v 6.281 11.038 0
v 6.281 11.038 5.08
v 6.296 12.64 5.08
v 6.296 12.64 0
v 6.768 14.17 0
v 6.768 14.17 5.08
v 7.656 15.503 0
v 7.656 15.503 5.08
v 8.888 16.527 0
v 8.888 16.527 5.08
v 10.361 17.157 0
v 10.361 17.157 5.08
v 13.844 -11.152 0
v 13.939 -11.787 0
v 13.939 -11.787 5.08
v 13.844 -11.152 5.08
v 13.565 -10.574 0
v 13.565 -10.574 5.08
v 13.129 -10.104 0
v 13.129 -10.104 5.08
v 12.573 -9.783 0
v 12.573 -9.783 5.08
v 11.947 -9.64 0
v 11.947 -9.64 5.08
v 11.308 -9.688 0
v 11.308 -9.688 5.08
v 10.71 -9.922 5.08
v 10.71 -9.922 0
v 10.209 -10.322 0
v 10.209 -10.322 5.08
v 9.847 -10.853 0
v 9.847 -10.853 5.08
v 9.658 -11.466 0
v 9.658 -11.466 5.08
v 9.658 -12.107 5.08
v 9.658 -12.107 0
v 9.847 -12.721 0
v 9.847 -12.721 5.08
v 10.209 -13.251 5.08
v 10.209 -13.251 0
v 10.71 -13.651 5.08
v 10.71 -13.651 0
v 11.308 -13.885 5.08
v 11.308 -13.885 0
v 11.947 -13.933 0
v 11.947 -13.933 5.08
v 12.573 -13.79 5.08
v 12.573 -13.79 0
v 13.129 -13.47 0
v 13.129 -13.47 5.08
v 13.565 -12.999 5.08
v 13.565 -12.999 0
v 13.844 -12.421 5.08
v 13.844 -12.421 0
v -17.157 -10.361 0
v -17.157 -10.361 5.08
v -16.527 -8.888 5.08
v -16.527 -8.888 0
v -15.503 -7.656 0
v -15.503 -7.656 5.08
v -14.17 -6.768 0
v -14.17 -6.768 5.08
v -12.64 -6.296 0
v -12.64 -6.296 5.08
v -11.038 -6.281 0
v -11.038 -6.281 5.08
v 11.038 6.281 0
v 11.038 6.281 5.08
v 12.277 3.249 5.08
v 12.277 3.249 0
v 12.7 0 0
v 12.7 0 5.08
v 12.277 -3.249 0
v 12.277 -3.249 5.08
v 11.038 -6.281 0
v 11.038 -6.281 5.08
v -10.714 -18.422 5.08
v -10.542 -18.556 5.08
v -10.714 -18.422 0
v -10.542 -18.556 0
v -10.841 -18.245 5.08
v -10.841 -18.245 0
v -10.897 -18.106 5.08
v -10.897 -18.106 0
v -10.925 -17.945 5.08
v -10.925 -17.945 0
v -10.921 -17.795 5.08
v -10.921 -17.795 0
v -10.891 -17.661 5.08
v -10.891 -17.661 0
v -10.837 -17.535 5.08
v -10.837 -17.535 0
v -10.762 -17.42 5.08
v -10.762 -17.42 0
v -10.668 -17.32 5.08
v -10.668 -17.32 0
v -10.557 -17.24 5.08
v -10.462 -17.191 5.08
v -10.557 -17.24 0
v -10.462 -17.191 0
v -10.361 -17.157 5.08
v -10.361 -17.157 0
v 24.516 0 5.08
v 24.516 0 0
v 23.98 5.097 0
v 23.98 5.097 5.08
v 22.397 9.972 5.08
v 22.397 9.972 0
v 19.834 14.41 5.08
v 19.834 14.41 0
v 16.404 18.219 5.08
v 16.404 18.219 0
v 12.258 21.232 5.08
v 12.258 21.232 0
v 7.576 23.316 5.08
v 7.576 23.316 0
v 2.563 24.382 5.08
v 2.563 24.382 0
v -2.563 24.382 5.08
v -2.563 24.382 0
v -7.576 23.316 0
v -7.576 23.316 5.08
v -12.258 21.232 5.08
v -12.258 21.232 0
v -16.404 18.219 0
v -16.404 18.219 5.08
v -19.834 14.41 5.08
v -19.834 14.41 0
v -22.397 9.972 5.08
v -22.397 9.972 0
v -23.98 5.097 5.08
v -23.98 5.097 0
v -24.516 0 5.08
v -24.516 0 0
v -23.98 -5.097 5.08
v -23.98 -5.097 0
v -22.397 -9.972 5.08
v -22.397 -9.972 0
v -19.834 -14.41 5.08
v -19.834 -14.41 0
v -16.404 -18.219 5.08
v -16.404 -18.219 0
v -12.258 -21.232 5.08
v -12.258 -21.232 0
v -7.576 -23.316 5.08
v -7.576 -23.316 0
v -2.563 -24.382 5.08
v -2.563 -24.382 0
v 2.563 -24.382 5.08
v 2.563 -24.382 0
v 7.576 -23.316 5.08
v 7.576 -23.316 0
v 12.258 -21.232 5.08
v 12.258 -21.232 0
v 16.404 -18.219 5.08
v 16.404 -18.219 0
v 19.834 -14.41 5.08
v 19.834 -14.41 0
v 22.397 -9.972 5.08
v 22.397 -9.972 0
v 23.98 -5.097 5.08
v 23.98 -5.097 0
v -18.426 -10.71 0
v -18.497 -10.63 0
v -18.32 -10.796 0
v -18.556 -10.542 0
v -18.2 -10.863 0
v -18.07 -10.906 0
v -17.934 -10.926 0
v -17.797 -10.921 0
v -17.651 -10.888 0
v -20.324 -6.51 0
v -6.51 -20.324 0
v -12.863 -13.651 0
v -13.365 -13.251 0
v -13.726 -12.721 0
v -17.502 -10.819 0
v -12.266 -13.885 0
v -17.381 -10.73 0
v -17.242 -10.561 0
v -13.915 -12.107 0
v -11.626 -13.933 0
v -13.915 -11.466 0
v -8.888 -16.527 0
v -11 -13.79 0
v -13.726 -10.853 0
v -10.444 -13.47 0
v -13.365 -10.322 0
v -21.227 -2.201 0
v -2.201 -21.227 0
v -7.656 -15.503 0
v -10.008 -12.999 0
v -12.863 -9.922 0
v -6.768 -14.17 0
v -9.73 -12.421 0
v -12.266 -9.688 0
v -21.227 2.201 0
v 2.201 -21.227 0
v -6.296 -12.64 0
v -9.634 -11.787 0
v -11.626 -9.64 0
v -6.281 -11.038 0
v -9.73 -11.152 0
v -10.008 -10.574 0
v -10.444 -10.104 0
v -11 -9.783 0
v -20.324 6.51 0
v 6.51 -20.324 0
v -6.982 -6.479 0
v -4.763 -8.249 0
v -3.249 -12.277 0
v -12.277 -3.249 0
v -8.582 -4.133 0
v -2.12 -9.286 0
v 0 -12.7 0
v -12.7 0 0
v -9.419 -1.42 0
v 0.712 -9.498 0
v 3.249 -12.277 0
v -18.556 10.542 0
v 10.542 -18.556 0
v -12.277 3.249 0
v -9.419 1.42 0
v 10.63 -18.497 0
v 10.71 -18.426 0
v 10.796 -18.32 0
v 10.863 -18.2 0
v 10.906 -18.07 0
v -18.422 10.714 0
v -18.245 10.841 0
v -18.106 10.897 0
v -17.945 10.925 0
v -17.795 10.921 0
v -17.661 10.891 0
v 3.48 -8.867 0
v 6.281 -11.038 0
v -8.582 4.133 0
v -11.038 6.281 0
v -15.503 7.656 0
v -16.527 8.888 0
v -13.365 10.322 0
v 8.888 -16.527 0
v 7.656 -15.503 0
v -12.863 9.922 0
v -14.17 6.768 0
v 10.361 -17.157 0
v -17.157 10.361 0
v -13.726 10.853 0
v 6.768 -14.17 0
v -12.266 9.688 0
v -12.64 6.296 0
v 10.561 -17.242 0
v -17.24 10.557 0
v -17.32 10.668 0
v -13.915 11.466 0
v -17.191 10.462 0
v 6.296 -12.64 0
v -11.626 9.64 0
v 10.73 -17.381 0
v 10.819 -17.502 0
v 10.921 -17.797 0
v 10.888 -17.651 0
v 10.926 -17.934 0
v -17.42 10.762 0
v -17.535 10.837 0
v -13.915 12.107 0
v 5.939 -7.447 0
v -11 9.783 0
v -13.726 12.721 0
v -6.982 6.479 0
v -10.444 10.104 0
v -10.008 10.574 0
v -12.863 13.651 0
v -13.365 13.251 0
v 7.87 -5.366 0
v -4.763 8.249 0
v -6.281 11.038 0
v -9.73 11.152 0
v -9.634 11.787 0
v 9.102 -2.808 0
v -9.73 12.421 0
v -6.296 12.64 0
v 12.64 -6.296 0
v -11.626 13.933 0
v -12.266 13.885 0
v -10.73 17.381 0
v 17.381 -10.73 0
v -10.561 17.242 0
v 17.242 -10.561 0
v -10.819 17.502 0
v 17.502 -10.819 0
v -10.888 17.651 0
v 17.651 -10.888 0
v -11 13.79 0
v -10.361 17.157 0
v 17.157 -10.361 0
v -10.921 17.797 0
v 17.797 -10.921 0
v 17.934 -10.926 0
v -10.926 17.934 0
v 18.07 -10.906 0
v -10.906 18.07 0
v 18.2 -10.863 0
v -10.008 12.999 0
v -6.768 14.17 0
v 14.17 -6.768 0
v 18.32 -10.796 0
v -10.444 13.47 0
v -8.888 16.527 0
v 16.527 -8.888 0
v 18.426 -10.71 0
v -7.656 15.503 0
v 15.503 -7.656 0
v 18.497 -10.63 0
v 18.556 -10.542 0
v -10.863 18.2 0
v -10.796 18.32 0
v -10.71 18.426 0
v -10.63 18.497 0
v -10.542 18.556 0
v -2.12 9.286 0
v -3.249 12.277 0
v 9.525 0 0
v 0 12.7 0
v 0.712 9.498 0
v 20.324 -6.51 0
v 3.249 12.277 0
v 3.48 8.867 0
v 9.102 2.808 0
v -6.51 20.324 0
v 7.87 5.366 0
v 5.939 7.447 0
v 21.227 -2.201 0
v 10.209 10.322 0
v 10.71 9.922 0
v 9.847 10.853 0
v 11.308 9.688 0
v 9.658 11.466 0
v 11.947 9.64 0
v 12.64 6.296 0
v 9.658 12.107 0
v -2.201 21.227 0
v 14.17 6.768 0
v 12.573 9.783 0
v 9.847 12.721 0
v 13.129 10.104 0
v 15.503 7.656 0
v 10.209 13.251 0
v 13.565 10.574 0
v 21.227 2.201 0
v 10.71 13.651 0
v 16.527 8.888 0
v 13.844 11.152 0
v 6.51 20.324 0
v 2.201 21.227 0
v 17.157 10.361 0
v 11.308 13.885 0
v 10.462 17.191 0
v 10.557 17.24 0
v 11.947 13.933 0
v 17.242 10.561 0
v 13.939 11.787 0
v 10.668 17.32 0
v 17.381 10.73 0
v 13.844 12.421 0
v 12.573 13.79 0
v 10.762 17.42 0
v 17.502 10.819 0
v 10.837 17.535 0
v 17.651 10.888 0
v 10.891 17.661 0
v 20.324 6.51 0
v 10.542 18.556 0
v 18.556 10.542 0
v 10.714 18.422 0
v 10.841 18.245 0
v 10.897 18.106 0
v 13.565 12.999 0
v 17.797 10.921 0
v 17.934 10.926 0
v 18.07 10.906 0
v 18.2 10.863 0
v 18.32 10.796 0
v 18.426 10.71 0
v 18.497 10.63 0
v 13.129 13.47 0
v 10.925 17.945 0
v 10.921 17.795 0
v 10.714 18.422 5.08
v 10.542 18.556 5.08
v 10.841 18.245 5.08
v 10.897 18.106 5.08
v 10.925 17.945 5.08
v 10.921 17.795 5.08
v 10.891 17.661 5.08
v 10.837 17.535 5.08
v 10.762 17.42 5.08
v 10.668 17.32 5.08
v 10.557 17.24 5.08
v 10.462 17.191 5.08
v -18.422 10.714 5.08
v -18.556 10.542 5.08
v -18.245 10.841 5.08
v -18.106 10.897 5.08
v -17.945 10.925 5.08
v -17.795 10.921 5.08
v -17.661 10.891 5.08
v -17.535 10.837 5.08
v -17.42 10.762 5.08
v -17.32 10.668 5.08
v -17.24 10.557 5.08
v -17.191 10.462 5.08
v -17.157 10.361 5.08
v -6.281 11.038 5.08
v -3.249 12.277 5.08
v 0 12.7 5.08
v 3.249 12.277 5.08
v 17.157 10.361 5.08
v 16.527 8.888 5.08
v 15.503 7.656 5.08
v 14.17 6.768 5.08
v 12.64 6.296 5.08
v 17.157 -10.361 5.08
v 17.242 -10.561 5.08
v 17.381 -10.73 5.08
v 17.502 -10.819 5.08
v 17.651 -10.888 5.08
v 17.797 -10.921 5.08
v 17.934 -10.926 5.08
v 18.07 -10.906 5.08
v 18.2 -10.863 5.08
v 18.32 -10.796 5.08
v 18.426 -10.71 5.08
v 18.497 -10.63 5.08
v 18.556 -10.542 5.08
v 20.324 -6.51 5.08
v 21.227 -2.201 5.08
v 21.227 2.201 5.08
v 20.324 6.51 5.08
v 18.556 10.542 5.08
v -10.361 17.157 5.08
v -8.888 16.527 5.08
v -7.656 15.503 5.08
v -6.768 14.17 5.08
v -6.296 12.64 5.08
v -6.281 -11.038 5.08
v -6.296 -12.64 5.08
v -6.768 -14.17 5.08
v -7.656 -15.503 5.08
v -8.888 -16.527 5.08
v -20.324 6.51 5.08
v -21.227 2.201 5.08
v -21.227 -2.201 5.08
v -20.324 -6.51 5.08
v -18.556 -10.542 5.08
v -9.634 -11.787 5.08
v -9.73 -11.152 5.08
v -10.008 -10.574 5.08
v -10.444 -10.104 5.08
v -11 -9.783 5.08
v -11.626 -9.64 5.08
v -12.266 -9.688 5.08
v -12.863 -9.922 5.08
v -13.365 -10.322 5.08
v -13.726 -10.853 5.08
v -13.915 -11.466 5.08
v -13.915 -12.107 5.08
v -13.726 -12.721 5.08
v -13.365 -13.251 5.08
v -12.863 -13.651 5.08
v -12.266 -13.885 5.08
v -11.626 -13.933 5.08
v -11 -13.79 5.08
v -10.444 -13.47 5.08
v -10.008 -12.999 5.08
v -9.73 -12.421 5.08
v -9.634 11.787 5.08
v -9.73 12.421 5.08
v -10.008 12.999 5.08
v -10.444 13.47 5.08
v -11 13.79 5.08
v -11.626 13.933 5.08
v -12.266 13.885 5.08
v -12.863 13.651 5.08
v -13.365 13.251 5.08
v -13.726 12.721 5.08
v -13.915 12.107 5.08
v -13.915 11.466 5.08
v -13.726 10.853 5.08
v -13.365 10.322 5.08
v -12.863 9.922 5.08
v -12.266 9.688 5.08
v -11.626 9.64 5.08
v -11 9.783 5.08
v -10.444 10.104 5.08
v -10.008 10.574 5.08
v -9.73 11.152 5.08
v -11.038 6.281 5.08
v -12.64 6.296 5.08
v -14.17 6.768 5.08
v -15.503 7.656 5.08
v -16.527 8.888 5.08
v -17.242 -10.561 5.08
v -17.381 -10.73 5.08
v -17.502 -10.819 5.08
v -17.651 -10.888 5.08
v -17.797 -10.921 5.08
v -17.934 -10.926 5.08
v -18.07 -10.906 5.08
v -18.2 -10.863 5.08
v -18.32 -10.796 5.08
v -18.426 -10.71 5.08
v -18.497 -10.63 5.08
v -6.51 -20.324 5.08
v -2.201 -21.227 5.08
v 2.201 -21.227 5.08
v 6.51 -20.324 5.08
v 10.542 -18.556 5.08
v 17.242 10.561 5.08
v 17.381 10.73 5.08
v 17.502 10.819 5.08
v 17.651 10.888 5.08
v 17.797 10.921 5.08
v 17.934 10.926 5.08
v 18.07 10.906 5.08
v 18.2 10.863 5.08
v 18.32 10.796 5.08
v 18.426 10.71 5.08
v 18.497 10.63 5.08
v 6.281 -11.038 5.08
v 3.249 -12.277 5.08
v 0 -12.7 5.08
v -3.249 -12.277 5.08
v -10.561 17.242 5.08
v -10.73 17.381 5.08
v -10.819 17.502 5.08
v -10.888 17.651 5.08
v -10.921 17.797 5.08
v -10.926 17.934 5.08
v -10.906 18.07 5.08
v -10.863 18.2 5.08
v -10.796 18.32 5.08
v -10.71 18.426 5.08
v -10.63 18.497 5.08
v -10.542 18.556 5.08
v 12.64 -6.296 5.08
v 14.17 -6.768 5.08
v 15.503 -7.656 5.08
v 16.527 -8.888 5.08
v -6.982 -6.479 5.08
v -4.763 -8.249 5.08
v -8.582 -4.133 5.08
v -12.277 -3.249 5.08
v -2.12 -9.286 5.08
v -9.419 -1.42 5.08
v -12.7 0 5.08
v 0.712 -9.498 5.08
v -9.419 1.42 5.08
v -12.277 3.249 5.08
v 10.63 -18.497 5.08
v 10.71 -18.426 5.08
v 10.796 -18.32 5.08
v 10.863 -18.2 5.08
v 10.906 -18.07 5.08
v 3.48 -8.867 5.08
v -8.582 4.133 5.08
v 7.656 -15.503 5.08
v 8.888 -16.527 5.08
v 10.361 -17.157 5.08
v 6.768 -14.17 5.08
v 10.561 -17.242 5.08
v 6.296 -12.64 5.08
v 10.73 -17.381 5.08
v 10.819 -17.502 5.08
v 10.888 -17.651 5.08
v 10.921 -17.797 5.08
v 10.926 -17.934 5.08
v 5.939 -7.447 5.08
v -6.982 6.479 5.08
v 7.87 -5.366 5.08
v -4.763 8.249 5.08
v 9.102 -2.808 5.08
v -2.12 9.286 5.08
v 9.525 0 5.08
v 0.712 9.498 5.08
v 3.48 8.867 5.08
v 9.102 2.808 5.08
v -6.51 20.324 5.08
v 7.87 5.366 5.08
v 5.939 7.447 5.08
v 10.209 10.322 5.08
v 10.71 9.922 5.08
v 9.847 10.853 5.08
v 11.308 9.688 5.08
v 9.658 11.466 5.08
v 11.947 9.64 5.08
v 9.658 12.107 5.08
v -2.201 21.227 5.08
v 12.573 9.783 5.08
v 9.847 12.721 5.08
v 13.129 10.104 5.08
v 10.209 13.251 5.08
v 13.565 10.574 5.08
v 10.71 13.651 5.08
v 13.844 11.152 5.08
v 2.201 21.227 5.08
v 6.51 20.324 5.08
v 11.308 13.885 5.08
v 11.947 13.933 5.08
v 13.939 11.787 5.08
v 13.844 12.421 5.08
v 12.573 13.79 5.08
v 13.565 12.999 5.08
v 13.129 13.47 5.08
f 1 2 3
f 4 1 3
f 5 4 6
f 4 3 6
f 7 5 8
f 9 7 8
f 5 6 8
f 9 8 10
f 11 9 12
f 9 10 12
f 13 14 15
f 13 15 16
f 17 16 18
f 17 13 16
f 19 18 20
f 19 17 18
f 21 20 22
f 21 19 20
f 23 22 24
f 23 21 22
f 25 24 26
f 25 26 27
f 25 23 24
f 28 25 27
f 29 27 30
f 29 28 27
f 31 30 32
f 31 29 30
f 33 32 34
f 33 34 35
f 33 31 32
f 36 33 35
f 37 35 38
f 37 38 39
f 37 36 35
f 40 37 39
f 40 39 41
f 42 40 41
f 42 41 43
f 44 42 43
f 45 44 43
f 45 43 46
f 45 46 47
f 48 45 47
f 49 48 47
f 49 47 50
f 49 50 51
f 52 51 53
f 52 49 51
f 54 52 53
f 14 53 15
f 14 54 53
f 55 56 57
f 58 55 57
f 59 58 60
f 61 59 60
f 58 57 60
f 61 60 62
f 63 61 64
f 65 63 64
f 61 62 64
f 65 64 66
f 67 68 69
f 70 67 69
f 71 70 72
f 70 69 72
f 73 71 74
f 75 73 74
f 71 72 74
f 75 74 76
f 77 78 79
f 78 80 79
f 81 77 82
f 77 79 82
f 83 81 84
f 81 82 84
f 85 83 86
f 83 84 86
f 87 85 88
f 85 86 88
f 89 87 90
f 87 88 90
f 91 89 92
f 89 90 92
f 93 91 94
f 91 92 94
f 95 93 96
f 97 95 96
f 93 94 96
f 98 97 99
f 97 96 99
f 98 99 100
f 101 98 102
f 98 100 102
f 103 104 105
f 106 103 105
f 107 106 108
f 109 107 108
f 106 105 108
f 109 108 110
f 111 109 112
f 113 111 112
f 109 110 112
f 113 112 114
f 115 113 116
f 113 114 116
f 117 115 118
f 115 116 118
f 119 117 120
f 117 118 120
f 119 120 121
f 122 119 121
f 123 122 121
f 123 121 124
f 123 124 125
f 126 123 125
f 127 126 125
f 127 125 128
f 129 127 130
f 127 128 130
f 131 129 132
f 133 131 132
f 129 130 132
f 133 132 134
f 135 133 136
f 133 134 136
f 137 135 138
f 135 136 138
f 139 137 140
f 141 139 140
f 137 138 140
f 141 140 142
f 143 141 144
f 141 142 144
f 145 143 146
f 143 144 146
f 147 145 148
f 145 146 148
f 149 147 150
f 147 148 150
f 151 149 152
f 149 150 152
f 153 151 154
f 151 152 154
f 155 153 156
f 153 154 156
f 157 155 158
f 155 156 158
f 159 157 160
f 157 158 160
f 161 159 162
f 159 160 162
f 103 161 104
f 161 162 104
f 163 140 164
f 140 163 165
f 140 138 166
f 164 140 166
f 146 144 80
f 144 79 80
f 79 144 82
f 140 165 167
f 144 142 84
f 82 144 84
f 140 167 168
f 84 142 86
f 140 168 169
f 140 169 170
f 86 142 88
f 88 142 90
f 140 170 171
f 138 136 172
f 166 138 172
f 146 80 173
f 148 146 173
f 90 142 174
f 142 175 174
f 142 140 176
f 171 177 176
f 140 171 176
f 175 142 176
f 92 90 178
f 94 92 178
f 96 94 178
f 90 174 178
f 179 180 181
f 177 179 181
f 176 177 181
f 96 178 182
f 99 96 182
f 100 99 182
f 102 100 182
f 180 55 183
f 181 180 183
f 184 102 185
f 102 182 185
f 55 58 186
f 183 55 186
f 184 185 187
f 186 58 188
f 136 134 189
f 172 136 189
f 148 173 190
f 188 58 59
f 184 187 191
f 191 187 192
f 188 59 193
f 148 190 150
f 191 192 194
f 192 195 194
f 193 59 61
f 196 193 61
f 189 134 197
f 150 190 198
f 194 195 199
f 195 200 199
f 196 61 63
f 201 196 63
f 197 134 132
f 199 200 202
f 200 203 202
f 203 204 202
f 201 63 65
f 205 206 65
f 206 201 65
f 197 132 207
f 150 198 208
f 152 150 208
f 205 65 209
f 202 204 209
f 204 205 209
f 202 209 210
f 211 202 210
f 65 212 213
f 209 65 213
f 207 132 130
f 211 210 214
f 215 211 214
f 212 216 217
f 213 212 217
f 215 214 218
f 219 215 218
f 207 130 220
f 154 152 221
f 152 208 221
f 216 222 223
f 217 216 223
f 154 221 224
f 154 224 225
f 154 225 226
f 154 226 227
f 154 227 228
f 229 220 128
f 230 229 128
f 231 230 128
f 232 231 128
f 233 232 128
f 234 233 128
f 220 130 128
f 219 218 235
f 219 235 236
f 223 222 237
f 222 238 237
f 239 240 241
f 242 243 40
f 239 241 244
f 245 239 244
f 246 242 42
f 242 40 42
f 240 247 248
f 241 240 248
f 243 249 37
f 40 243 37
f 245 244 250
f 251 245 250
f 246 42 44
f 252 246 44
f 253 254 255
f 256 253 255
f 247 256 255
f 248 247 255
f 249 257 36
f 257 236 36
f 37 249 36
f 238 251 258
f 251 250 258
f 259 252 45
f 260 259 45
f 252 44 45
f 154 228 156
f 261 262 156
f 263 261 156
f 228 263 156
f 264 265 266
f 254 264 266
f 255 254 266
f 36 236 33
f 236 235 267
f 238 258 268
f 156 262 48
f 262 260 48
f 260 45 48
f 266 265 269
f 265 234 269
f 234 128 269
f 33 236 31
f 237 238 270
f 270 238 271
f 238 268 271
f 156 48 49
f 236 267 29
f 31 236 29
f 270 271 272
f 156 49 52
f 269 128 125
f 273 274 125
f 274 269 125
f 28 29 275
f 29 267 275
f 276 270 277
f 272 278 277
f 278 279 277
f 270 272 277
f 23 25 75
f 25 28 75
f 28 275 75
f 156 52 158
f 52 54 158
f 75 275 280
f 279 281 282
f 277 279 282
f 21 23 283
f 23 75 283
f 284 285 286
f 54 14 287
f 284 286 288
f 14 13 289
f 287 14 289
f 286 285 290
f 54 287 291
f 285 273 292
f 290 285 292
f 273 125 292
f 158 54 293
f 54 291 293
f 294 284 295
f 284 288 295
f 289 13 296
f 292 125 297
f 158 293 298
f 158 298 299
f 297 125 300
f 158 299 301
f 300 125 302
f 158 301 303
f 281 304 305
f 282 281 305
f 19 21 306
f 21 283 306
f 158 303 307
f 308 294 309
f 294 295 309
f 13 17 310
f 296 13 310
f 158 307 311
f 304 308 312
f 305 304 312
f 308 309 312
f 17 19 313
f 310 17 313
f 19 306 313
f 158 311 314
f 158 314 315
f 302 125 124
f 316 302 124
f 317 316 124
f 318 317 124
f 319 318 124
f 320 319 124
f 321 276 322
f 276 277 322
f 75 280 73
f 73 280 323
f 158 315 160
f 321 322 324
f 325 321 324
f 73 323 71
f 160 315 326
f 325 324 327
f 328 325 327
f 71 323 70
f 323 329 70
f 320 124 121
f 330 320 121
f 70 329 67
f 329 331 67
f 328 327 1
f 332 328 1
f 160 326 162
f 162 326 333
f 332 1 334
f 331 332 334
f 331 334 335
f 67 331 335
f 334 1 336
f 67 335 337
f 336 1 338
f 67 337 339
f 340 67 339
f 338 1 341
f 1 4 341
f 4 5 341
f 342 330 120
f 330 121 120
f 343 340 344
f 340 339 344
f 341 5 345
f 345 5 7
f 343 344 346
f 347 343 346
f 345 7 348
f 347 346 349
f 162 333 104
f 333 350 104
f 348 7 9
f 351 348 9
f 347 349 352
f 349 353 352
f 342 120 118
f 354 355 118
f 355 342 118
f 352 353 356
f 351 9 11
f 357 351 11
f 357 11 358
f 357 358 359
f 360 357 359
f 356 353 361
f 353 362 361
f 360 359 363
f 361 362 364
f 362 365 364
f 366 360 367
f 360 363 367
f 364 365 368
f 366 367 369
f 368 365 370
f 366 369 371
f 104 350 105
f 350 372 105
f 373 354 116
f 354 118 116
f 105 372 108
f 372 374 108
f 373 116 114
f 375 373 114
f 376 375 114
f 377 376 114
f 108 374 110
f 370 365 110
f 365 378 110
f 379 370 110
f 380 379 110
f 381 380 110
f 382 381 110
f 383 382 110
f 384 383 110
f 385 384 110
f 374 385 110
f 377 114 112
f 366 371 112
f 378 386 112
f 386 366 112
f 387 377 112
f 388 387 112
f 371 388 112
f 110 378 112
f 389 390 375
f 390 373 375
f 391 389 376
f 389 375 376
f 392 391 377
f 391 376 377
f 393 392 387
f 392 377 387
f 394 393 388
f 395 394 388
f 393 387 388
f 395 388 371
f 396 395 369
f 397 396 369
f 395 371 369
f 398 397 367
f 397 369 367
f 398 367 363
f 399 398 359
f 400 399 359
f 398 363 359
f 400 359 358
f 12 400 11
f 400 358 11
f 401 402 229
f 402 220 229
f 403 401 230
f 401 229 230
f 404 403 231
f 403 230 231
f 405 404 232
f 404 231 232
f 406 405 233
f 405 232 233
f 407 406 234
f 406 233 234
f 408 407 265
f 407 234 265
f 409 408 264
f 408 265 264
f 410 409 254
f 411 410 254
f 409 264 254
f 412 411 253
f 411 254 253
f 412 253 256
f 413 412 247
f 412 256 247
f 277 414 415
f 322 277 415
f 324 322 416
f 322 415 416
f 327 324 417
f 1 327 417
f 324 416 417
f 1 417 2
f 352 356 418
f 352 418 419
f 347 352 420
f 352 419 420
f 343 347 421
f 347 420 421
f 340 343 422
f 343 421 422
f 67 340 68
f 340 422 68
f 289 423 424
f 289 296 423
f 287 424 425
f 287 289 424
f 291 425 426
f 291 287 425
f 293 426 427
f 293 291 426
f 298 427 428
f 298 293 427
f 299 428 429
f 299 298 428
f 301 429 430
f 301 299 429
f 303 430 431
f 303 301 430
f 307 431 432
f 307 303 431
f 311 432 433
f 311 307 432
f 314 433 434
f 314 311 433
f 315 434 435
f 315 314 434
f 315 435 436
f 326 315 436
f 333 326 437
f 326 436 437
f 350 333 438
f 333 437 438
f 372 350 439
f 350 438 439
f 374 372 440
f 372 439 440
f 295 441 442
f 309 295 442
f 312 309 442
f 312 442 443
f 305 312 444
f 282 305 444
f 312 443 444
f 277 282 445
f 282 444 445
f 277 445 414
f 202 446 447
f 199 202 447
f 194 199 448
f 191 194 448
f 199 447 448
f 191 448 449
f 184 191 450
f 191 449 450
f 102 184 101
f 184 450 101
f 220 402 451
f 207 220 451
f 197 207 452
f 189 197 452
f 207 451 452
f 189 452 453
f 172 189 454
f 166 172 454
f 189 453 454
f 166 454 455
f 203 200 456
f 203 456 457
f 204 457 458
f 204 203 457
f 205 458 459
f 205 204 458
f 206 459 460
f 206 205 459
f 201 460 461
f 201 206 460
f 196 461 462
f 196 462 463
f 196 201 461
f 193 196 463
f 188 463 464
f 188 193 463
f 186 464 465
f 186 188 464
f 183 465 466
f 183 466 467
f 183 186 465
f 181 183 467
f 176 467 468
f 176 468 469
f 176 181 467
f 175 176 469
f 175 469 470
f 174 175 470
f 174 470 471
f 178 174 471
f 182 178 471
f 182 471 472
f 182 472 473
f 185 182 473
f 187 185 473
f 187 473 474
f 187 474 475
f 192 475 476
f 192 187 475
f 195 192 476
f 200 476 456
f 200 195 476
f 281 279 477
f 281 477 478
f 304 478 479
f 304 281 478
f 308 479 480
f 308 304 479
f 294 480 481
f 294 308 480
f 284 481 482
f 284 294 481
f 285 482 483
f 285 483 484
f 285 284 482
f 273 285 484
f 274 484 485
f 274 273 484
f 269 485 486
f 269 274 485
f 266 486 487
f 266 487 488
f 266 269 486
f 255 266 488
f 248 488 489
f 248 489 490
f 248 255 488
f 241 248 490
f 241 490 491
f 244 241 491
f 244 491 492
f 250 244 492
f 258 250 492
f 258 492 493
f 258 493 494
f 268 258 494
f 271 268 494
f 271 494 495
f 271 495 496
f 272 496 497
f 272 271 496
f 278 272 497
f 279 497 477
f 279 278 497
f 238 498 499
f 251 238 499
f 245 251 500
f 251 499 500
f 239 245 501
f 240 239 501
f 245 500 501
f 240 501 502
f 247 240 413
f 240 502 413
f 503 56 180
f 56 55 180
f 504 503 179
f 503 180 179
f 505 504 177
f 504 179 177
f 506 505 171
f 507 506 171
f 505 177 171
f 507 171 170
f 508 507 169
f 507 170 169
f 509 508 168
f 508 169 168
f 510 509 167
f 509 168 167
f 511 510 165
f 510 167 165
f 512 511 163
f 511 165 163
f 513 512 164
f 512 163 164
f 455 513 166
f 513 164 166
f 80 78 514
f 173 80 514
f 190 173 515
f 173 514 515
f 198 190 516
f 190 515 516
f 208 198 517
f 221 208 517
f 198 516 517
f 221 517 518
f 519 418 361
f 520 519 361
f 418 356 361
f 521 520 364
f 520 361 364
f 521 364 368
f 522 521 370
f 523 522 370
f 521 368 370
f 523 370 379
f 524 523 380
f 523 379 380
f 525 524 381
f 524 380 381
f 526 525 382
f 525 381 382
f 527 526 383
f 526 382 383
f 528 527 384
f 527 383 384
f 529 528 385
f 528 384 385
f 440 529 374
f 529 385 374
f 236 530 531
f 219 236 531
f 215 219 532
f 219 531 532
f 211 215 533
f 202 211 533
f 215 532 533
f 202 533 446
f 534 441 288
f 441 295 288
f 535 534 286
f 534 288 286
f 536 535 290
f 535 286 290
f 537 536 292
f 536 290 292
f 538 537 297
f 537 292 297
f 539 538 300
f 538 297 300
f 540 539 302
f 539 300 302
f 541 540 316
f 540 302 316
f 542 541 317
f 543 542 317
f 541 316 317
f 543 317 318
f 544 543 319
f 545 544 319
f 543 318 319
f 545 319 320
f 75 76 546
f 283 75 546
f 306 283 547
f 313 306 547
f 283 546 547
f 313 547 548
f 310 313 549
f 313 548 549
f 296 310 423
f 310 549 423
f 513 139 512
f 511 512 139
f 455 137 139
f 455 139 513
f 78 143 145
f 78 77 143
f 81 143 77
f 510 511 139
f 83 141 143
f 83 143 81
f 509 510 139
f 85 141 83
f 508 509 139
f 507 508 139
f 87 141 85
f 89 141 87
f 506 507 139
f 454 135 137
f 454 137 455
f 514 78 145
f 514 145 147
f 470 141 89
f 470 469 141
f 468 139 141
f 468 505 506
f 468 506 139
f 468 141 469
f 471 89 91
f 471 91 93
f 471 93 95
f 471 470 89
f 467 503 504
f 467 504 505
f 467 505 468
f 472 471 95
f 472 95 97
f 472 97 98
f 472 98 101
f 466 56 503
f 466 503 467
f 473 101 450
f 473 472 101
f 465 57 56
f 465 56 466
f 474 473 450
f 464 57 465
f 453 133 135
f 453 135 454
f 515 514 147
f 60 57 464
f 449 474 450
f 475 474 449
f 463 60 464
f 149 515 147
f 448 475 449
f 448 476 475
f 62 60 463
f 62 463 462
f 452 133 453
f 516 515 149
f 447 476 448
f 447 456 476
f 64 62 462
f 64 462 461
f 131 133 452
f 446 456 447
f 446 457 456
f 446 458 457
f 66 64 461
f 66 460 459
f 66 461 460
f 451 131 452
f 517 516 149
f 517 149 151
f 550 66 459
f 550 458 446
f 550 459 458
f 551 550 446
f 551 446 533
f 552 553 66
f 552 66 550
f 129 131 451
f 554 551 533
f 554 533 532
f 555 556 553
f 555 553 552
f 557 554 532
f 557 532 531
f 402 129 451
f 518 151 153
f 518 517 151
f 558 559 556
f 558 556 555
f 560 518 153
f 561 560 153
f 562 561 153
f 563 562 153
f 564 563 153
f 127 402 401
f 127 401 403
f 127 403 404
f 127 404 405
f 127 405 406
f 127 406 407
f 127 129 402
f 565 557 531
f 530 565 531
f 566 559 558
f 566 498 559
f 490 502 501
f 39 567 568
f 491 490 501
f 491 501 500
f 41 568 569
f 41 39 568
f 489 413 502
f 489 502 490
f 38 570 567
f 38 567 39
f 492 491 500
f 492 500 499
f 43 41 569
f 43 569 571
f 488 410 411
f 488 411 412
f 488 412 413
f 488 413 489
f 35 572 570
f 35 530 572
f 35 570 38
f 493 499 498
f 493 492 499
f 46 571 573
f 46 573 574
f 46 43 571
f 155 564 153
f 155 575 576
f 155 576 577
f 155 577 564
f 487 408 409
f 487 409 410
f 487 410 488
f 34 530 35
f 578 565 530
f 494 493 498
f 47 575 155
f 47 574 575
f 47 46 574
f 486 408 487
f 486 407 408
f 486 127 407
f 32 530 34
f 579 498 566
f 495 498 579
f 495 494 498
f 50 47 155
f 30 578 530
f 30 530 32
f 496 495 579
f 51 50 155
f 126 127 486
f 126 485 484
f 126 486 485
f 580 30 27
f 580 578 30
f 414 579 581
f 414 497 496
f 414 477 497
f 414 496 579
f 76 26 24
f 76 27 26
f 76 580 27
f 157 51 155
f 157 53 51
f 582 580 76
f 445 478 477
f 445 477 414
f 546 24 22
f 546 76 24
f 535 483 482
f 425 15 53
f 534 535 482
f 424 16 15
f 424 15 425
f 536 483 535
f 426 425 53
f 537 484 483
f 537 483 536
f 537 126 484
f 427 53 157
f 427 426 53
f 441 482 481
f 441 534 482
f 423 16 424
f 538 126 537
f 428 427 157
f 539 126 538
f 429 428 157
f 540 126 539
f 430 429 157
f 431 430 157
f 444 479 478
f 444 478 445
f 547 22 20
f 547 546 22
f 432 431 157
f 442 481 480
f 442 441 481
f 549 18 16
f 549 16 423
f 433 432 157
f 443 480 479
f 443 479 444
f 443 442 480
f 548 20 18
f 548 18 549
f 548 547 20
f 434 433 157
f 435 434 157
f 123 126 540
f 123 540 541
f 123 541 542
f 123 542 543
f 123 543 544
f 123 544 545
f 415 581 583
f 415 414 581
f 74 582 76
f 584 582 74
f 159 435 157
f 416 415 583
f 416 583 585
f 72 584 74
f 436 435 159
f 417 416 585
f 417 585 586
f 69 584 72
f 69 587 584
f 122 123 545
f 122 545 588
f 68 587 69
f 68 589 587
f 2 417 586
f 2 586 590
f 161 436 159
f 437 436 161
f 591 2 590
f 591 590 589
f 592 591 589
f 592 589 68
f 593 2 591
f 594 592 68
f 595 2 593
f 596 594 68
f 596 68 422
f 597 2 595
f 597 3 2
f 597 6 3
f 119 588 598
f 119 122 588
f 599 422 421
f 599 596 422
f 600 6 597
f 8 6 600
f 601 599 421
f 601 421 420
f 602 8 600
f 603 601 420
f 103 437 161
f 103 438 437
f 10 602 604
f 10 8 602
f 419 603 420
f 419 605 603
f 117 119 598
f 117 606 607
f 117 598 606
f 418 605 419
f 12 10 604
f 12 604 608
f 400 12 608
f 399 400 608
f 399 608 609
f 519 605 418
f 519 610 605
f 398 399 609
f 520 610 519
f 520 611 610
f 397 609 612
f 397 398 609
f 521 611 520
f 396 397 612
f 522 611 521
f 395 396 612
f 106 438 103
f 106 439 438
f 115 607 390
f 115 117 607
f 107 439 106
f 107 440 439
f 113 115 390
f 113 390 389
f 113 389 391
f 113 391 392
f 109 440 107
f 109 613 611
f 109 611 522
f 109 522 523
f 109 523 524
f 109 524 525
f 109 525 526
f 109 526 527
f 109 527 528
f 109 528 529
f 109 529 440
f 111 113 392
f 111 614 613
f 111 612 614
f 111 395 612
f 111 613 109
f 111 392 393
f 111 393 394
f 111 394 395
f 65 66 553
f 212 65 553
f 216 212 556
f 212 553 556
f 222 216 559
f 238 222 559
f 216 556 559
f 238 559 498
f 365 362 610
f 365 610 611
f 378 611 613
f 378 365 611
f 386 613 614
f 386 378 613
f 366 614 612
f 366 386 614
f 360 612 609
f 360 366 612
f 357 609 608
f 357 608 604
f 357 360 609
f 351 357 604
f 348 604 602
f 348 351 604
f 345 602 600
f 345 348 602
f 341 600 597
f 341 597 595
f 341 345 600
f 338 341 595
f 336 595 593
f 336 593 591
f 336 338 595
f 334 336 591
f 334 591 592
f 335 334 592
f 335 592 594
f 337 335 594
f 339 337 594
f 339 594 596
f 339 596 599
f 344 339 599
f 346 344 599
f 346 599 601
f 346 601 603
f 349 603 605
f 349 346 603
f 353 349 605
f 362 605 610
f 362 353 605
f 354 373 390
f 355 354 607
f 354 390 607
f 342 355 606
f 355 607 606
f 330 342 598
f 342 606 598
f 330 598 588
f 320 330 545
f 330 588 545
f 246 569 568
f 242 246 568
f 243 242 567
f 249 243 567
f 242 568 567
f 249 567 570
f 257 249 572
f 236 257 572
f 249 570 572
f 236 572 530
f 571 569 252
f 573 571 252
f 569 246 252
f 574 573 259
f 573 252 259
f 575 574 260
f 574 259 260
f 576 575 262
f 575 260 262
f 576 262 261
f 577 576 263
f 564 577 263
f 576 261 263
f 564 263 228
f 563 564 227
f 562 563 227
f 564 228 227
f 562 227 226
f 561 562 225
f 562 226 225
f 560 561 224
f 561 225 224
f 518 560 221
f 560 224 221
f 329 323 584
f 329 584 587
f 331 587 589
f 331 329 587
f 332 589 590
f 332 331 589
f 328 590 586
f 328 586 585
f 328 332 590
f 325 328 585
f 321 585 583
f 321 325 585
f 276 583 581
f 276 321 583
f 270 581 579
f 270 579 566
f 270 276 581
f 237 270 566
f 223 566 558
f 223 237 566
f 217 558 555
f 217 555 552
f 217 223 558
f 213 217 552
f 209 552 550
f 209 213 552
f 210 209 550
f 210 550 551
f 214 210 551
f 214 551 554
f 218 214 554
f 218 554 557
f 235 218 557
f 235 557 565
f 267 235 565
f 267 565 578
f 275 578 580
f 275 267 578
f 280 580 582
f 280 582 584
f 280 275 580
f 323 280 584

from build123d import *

# Parameters (mm, degrees)
F0_R            = 24.51608
F0_R_2          = 2.15265
F0_R_3          = 9.525
F1_DEPTH        = 5.08
F3_DEPTH        = 5.08
F3_COPIES_COUNT = 4
F4_R            = 0.762


# Not quite as in the source:
# - a pattern or mirror of a feature is missing from the dataset's text; its kind, count and spacing are read off the source's solid


with BuildPart() as f1:
    # F0 (on Top) → F1 (new body)
    with BuildSketch(Plane.XY):
        Circle(F0_R)
        with Locations((-11.7865906, -11.7865906)):
            Circle(F0_R_2, mode=Mode.SUBTRACT)
        with Locations((11.7865906, -11.7865906)):
            Circle(F0_R_2, mode=Mode.SUBTRACT)
        with Locations((-11.7865906, 11.7865906)):
            Circle(F0_R_2, mode=Mode.SUBTRACT)
        Circle(F0_R_3, mode=Mode.SUBTRACT)
        with Locations((11.7865906, 11.7865906)):
            Circle(F0_R_2, mode=Mode.SUBTRACT)
    extrude(amount=F1_DEPTH)

    # F2 (on face) → F3 (cut, through all)
    with BuildSketch(Plane.XY.offset(5.08)):
        with BuildLine():
            ThreePointArc((-12.5005198818, 17.2967828873), (-7.8454136559, 15.7030990397), (-6.2809895182, 11.0380782146))
            ThreePointArc((-6.2809895182, 11.0380782146), (0, 12.7), (6.2809895182, 11.0380782146))
            ThreePointArc((6.2809895182, 11.0380782146), (7.8454136559, 15.7030990397), (12.5005198818, 17.2967828873))
            ThreePointArc((12.5005198818, 17.2967828873), (0, 21.34108), (-12.5005198818, 17.2967828873))
        make_face()
    f3 = extrude(amount=-F3_DEPTH, mode=Mode.SUBTRACT)

    # F3_copies: F3 ×4 about axis
    f3_copies_axis = Axis((0, 0, 0), (0, 0, 1))
    for i in range(1, F3_COPIES_COUNT):
        add(f3.rotate(f3_copies_axis, i * 360 / F3_COPIES_COUNT), mode=Mode.SUBTRACT)

    # F4
    f4_edges = [f1.edges().sort_by_distance(p)[0] for p in [
        (-12.50052, 17.296783, 2.54),
        (12.50052, 17.296783, 2.54),
        (-17.296783, 12.50052, 2.54),
        (-17.296783, -12.50052, 2.54),
        (-12.50052, -17.296783, 2.54),
        (12.50052, -17.296783, 2.54),
        (17.296783, -12.50052, 2.54),
        (17.296783, 12.50052, 2.54),
    ]]
    fillet(f4_edges, radius=F4_R)


solid = f1.part
